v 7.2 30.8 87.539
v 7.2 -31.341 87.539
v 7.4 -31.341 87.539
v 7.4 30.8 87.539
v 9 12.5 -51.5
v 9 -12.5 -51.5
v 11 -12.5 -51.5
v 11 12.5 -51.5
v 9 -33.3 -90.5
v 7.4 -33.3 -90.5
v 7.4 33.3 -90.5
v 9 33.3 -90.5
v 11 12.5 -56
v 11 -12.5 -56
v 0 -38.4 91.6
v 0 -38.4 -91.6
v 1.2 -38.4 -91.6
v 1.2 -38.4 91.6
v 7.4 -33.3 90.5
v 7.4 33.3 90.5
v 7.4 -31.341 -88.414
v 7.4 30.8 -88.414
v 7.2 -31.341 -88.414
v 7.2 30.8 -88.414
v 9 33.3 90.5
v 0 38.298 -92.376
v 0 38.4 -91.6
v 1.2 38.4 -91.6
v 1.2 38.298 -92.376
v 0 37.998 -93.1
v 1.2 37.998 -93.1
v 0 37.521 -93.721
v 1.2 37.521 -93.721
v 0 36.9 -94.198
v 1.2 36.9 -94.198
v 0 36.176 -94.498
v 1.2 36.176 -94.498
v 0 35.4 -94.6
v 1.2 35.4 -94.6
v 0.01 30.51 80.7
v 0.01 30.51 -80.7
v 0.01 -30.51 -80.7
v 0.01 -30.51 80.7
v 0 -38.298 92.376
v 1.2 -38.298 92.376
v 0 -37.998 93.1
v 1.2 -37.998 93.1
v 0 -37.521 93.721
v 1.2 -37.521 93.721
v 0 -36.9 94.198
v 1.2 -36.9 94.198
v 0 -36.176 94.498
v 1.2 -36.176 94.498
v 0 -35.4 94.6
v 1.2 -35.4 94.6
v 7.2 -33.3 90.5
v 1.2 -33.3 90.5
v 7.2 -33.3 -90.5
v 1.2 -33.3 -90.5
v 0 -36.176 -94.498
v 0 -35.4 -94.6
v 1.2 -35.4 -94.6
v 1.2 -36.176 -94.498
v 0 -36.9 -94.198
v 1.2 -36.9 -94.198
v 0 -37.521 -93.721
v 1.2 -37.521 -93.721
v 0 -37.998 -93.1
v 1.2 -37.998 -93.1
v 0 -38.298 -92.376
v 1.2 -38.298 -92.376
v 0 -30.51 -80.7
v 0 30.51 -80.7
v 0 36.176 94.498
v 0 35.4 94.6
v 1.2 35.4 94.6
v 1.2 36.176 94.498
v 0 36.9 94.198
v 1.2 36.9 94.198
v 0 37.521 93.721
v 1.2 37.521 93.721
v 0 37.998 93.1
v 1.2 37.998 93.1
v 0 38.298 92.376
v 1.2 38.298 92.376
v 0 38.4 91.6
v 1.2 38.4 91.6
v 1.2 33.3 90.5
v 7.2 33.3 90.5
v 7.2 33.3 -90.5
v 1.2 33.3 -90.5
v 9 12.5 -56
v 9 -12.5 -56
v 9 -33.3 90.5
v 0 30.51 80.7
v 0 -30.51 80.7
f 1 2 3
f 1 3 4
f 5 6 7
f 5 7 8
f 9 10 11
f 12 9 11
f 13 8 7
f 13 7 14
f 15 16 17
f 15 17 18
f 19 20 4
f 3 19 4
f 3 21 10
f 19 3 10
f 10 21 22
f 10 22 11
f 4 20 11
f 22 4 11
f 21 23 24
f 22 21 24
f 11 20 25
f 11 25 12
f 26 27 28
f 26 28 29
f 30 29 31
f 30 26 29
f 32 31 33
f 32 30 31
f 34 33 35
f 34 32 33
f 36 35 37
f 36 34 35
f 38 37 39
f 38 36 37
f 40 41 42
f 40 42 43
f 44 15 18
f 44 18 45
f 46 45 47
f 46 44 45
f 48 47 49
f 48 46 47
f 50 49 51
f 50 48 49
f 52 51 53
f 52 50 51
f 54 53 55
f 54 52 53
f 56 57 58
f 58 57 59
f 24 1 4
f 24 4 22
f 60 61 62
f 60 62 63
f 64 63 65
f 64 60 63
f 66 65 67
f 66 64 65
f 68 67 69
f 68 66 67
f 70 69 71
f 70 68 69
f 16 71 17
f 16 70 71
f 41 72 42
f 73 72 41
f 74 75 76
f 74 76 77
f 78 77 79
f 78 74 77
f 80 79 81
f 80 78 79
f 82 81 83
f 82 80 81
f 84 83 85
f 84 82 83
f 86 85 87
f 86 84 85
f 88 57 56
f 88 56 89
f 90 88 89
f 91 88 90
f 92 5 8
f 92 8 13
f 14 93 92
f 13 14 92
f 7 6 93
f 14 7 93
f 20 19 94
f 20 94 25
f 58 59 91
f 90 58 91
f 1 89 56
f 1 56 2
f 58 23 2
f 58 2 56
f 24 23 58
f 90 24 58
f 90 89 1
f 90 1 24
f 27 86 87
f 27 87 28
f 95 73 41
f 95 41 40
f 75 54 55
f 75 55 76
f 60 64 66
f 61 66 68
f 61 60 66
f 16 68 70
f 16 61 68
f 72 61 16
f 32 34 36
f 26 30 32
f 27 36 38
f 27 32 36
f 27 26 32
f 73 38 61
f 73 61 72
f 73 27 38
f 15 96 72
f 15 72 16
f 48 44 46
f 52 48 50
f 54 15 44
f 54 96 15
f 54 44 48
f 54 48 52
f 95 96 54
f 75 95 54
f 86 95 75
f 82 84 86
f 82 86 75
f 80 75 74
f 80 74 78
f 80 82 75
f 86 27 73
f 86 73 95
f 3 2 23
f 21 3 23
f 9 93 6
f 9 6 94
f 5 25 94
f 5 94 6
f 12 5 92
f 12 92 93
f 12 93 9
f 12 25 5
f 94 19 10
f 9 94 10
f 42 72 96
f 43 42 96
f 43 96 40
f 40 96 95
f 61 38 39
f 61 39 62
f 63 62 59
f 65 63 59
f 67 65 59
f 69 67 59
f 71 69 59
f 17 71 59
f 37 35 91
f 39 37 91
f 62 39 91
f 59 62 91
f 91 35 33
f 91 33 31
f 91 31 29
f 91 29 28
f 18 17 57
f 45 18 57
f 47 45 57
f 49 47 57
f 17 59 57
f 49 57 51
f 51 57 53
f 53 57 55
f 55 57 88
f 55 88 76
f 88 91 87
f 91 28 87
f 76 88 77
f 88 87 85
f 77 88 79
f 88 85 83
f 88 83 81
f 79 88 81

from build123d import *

# Parameters (mm, degrees)
EXTRUDE_1_DEPTH     = 1.2
SKETCH_2_W          = 181
SKETCH_2_H          = 66.6
EXTRUDE_2_DEPTH     = 6
SKETCH_3_W          = 175.952774737
SKETCH_3_H          = 62.140674221
EXTRUDE_3_DEPTH     = 0.2
SKETCH_4_W          = 181
SKETCH_4_H          = 66.6
EXTRUDE_4_DEPTH     = 1.6
SKETCH_5_W          = 161.4
SKETCH_5_H          = 61.02
CUT_EXTRUDE_1_DEPTH = 0.01
SKETCH_7_W          = 4.5
SKETCH_7_H          = 25
EXTRUDE_5_DEPTH     = 2


with BuildPart() as part:
    # Эскиз1 (on Right Plane) → Бобышка-Вытянуть1 (new body)
    with BuildSketch(Plane(origin=(0, 0, 0), x_dir=(0, 0, -1), z_dir=(1, 0, 0))):
        with BuildLine():
            Line((91.6, -38.4), (-91.6, -38.4))
            ThreePointArc((-91.6, -38.4), (-93.721320344, -37.521320344), (-94.6, -35.4))
            Line((-94.6, -35.4), (-94.6, 35.4))
            ThreePointArc((-94.6, 35.4), (-93.721320344, 37.521320344), (-91.6, 38.4))
            Line((-91.6, 38.4), (91.6, 38.4))
            ThreePointArc((91.6, 38.4), (93.721320344, 37.521320344), (94.6, 35.4))
            Line((94.6, 35.4), (94.6, -35.4))
            ThreePointArc((94.6, -35.4), (93.721320344, -37.521320344), (91.6, -38.4))
        make_face()
    extrude(amount=EXTRUDE_1_DEPTH)

    # Эскиз2 → Бобышка-Вытянуть2 (add)
    with BuildSketch(Plane(origin=(1.2, 0, 0), x_dir=(0, 0, -1), z_dir=(1, 0, 0))):
        Rectangle(SKETCH_2_W, SKETCH_2_H)
    extrude(amount=EXTRUDE_2_DEPTH)

    # Эскиз3 → Бобышка-Вытянуть3 (add)
    with BuildSketch(Plane(origin=(7.2, 0, 0), x_dir=(0, 0, -1), z_dir=(1, 0, 0))):
        with Locations((0.437545425, -0.270444937)):
            Rectangle(SKETCH_3_W, SKETCH_3_H)
    extrude(amount=EXTRUDE_3_DEPTH)

    # Эскиз4 → Бобышка-Вытянуть4 (add)
    with BuildSketch(Plane(origin=(7.4, 0, 0), x_dir=(0, 0, -1), z_dir=(1, 0, 0))):
        Rectangle(SKETCH_4_W, SKETCH_4_H)
    extrude(amount=EXTRUDE_4_DEPTH)

    # Эскиз5 → Вырез-Вытянуть1 (cut)
    with BuildSketch(Plane.ZY):
        Rectangle(SKETCH_5_W, SKETCH_5_H)
    extrude(amount=-CUT_EXTRUDE_1_DEPTH, mode=Mode.SUBTRACT)

    # Эскиз7 → Бобышка-Вытянуть5 (add)
    with BuildSketch(Plane(origin=(9, 0, 0), x_dir=(0, 0, -1), z_dir=(1, 0, 0))):
        with Locations((53.75, 0)):
            Rectangle(SKETCH_7_W, SKETCH_7_H)
    extrude(amount=EXTRUDE_5_DEPTH)


solid = part.part
